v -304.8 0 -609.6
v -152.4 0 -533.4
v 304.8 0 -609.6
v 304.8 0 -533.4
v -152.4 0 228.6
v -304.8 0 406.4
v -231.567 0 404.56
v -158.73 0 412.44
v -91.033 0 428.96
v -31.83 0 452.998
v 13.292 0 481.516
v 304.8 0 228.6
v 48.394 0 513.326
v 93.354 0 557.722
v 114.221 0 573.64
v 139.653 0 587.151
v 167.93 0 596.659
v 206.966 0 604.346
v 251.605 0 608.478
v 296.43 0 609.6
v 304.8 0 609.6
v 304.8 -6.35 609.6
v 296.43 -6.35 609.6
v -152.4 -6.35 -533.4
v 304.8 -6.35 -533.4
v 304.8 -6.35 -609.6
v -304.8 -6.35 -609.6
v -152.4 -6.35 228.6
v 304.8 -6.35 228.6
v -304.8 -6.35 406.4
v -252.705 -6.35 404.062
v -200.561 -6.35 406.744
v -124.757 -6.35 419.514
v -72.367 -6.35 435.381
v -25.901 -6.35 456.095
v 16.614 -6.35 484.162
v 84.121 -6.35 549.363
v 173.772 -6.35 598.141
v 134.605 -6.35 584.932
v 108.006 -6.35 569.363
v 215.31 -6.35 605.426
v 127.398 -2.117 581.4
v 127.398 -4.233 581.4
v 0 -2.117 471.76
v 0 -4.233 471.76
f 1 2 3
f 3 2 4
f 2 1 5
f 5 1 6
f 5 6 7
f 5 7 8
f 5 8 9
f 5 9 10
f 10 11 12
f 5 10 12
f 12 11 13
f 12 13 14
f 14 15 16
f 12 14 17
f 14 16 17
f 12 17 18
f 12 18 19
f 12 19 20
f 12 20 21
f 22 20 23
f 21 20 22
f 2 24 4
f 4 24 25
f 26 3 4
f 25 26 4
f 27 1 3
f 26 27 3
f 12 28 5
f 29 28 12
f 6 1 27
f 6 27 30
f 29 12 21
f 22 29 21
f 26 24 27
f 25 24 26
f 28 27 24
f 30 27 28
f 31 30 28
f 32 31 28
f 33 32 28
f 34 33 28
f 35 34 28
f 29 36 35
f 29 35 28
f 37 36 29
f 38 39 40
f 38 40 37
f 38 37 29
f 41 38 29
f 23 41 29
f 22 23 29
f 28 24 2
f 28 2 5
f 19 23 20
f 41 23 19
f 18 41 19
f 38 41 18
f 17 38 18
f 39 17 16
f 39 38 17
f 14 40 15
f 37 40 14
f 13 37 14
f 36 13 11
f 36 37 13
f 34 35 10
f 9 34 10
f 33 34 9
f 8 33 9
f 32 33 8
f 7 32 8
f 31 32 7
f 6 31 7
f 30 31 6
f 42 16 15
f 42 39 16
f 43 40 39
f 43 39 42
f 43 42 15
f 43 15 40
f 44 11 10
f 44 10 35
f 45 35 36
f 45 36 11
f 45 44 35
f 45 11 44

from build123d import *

# Parameters (mm, degrees)
F0_W     = 609.6
F0_H     = 1219.2
F1_DEPTH = 6.35
F2_W     = 457.2
F2_H     = 762
F3_DEPTH = 6.351
F5_DEPTH = 6.351


with BuildPart() as f1:
    # F0 (on Front) → F1 (new body)
    with BuildSketch(Plane.XZ):
        Rectangle(F0_W, F0_H)
    extrude(amount=F1_DEPTH)

    # F2 (on face) → F3 (cut, through all)
    with BuildSketch(Plane.XZ.offset(6.35)):
        with Locations((76.2, -152.4)):
            Rectangle(F2_W, F2_H)
    extrude(amount=-F3_DEPTH, mode=Mode.SUBTRACT)

    # F4 (on face) → F5 (cut, through all)
    with BuildSketch(Plane.XZ.offset(6.35)):
        with BuildLine():
            add(Edge.make_bspline(
                [(296.4302246945, 609.6), (244.3667710116, 609.455527572), (104.3394022526, 603.1283084808), (17.2121287356, 442.3559476606), (-192.9977127392, 395.6617339132), (-304.8, 406.4)],
                knots=[0.0157664589, 0.0157664589, 0.0157664589, 0.0157664589, 0.3044447211, 0.5989406507, 1, 1, 1, 1], degree=3))
            Line((296.4302246945, 609.6), (-304.8, 609.6))
            Line((-304.8, 609.6), (-304.8, 406.4))
        make_face()
    extrude(amount=-F5_DEPTH, mode=Mode.SUBTRACT)


solid = f1.part
